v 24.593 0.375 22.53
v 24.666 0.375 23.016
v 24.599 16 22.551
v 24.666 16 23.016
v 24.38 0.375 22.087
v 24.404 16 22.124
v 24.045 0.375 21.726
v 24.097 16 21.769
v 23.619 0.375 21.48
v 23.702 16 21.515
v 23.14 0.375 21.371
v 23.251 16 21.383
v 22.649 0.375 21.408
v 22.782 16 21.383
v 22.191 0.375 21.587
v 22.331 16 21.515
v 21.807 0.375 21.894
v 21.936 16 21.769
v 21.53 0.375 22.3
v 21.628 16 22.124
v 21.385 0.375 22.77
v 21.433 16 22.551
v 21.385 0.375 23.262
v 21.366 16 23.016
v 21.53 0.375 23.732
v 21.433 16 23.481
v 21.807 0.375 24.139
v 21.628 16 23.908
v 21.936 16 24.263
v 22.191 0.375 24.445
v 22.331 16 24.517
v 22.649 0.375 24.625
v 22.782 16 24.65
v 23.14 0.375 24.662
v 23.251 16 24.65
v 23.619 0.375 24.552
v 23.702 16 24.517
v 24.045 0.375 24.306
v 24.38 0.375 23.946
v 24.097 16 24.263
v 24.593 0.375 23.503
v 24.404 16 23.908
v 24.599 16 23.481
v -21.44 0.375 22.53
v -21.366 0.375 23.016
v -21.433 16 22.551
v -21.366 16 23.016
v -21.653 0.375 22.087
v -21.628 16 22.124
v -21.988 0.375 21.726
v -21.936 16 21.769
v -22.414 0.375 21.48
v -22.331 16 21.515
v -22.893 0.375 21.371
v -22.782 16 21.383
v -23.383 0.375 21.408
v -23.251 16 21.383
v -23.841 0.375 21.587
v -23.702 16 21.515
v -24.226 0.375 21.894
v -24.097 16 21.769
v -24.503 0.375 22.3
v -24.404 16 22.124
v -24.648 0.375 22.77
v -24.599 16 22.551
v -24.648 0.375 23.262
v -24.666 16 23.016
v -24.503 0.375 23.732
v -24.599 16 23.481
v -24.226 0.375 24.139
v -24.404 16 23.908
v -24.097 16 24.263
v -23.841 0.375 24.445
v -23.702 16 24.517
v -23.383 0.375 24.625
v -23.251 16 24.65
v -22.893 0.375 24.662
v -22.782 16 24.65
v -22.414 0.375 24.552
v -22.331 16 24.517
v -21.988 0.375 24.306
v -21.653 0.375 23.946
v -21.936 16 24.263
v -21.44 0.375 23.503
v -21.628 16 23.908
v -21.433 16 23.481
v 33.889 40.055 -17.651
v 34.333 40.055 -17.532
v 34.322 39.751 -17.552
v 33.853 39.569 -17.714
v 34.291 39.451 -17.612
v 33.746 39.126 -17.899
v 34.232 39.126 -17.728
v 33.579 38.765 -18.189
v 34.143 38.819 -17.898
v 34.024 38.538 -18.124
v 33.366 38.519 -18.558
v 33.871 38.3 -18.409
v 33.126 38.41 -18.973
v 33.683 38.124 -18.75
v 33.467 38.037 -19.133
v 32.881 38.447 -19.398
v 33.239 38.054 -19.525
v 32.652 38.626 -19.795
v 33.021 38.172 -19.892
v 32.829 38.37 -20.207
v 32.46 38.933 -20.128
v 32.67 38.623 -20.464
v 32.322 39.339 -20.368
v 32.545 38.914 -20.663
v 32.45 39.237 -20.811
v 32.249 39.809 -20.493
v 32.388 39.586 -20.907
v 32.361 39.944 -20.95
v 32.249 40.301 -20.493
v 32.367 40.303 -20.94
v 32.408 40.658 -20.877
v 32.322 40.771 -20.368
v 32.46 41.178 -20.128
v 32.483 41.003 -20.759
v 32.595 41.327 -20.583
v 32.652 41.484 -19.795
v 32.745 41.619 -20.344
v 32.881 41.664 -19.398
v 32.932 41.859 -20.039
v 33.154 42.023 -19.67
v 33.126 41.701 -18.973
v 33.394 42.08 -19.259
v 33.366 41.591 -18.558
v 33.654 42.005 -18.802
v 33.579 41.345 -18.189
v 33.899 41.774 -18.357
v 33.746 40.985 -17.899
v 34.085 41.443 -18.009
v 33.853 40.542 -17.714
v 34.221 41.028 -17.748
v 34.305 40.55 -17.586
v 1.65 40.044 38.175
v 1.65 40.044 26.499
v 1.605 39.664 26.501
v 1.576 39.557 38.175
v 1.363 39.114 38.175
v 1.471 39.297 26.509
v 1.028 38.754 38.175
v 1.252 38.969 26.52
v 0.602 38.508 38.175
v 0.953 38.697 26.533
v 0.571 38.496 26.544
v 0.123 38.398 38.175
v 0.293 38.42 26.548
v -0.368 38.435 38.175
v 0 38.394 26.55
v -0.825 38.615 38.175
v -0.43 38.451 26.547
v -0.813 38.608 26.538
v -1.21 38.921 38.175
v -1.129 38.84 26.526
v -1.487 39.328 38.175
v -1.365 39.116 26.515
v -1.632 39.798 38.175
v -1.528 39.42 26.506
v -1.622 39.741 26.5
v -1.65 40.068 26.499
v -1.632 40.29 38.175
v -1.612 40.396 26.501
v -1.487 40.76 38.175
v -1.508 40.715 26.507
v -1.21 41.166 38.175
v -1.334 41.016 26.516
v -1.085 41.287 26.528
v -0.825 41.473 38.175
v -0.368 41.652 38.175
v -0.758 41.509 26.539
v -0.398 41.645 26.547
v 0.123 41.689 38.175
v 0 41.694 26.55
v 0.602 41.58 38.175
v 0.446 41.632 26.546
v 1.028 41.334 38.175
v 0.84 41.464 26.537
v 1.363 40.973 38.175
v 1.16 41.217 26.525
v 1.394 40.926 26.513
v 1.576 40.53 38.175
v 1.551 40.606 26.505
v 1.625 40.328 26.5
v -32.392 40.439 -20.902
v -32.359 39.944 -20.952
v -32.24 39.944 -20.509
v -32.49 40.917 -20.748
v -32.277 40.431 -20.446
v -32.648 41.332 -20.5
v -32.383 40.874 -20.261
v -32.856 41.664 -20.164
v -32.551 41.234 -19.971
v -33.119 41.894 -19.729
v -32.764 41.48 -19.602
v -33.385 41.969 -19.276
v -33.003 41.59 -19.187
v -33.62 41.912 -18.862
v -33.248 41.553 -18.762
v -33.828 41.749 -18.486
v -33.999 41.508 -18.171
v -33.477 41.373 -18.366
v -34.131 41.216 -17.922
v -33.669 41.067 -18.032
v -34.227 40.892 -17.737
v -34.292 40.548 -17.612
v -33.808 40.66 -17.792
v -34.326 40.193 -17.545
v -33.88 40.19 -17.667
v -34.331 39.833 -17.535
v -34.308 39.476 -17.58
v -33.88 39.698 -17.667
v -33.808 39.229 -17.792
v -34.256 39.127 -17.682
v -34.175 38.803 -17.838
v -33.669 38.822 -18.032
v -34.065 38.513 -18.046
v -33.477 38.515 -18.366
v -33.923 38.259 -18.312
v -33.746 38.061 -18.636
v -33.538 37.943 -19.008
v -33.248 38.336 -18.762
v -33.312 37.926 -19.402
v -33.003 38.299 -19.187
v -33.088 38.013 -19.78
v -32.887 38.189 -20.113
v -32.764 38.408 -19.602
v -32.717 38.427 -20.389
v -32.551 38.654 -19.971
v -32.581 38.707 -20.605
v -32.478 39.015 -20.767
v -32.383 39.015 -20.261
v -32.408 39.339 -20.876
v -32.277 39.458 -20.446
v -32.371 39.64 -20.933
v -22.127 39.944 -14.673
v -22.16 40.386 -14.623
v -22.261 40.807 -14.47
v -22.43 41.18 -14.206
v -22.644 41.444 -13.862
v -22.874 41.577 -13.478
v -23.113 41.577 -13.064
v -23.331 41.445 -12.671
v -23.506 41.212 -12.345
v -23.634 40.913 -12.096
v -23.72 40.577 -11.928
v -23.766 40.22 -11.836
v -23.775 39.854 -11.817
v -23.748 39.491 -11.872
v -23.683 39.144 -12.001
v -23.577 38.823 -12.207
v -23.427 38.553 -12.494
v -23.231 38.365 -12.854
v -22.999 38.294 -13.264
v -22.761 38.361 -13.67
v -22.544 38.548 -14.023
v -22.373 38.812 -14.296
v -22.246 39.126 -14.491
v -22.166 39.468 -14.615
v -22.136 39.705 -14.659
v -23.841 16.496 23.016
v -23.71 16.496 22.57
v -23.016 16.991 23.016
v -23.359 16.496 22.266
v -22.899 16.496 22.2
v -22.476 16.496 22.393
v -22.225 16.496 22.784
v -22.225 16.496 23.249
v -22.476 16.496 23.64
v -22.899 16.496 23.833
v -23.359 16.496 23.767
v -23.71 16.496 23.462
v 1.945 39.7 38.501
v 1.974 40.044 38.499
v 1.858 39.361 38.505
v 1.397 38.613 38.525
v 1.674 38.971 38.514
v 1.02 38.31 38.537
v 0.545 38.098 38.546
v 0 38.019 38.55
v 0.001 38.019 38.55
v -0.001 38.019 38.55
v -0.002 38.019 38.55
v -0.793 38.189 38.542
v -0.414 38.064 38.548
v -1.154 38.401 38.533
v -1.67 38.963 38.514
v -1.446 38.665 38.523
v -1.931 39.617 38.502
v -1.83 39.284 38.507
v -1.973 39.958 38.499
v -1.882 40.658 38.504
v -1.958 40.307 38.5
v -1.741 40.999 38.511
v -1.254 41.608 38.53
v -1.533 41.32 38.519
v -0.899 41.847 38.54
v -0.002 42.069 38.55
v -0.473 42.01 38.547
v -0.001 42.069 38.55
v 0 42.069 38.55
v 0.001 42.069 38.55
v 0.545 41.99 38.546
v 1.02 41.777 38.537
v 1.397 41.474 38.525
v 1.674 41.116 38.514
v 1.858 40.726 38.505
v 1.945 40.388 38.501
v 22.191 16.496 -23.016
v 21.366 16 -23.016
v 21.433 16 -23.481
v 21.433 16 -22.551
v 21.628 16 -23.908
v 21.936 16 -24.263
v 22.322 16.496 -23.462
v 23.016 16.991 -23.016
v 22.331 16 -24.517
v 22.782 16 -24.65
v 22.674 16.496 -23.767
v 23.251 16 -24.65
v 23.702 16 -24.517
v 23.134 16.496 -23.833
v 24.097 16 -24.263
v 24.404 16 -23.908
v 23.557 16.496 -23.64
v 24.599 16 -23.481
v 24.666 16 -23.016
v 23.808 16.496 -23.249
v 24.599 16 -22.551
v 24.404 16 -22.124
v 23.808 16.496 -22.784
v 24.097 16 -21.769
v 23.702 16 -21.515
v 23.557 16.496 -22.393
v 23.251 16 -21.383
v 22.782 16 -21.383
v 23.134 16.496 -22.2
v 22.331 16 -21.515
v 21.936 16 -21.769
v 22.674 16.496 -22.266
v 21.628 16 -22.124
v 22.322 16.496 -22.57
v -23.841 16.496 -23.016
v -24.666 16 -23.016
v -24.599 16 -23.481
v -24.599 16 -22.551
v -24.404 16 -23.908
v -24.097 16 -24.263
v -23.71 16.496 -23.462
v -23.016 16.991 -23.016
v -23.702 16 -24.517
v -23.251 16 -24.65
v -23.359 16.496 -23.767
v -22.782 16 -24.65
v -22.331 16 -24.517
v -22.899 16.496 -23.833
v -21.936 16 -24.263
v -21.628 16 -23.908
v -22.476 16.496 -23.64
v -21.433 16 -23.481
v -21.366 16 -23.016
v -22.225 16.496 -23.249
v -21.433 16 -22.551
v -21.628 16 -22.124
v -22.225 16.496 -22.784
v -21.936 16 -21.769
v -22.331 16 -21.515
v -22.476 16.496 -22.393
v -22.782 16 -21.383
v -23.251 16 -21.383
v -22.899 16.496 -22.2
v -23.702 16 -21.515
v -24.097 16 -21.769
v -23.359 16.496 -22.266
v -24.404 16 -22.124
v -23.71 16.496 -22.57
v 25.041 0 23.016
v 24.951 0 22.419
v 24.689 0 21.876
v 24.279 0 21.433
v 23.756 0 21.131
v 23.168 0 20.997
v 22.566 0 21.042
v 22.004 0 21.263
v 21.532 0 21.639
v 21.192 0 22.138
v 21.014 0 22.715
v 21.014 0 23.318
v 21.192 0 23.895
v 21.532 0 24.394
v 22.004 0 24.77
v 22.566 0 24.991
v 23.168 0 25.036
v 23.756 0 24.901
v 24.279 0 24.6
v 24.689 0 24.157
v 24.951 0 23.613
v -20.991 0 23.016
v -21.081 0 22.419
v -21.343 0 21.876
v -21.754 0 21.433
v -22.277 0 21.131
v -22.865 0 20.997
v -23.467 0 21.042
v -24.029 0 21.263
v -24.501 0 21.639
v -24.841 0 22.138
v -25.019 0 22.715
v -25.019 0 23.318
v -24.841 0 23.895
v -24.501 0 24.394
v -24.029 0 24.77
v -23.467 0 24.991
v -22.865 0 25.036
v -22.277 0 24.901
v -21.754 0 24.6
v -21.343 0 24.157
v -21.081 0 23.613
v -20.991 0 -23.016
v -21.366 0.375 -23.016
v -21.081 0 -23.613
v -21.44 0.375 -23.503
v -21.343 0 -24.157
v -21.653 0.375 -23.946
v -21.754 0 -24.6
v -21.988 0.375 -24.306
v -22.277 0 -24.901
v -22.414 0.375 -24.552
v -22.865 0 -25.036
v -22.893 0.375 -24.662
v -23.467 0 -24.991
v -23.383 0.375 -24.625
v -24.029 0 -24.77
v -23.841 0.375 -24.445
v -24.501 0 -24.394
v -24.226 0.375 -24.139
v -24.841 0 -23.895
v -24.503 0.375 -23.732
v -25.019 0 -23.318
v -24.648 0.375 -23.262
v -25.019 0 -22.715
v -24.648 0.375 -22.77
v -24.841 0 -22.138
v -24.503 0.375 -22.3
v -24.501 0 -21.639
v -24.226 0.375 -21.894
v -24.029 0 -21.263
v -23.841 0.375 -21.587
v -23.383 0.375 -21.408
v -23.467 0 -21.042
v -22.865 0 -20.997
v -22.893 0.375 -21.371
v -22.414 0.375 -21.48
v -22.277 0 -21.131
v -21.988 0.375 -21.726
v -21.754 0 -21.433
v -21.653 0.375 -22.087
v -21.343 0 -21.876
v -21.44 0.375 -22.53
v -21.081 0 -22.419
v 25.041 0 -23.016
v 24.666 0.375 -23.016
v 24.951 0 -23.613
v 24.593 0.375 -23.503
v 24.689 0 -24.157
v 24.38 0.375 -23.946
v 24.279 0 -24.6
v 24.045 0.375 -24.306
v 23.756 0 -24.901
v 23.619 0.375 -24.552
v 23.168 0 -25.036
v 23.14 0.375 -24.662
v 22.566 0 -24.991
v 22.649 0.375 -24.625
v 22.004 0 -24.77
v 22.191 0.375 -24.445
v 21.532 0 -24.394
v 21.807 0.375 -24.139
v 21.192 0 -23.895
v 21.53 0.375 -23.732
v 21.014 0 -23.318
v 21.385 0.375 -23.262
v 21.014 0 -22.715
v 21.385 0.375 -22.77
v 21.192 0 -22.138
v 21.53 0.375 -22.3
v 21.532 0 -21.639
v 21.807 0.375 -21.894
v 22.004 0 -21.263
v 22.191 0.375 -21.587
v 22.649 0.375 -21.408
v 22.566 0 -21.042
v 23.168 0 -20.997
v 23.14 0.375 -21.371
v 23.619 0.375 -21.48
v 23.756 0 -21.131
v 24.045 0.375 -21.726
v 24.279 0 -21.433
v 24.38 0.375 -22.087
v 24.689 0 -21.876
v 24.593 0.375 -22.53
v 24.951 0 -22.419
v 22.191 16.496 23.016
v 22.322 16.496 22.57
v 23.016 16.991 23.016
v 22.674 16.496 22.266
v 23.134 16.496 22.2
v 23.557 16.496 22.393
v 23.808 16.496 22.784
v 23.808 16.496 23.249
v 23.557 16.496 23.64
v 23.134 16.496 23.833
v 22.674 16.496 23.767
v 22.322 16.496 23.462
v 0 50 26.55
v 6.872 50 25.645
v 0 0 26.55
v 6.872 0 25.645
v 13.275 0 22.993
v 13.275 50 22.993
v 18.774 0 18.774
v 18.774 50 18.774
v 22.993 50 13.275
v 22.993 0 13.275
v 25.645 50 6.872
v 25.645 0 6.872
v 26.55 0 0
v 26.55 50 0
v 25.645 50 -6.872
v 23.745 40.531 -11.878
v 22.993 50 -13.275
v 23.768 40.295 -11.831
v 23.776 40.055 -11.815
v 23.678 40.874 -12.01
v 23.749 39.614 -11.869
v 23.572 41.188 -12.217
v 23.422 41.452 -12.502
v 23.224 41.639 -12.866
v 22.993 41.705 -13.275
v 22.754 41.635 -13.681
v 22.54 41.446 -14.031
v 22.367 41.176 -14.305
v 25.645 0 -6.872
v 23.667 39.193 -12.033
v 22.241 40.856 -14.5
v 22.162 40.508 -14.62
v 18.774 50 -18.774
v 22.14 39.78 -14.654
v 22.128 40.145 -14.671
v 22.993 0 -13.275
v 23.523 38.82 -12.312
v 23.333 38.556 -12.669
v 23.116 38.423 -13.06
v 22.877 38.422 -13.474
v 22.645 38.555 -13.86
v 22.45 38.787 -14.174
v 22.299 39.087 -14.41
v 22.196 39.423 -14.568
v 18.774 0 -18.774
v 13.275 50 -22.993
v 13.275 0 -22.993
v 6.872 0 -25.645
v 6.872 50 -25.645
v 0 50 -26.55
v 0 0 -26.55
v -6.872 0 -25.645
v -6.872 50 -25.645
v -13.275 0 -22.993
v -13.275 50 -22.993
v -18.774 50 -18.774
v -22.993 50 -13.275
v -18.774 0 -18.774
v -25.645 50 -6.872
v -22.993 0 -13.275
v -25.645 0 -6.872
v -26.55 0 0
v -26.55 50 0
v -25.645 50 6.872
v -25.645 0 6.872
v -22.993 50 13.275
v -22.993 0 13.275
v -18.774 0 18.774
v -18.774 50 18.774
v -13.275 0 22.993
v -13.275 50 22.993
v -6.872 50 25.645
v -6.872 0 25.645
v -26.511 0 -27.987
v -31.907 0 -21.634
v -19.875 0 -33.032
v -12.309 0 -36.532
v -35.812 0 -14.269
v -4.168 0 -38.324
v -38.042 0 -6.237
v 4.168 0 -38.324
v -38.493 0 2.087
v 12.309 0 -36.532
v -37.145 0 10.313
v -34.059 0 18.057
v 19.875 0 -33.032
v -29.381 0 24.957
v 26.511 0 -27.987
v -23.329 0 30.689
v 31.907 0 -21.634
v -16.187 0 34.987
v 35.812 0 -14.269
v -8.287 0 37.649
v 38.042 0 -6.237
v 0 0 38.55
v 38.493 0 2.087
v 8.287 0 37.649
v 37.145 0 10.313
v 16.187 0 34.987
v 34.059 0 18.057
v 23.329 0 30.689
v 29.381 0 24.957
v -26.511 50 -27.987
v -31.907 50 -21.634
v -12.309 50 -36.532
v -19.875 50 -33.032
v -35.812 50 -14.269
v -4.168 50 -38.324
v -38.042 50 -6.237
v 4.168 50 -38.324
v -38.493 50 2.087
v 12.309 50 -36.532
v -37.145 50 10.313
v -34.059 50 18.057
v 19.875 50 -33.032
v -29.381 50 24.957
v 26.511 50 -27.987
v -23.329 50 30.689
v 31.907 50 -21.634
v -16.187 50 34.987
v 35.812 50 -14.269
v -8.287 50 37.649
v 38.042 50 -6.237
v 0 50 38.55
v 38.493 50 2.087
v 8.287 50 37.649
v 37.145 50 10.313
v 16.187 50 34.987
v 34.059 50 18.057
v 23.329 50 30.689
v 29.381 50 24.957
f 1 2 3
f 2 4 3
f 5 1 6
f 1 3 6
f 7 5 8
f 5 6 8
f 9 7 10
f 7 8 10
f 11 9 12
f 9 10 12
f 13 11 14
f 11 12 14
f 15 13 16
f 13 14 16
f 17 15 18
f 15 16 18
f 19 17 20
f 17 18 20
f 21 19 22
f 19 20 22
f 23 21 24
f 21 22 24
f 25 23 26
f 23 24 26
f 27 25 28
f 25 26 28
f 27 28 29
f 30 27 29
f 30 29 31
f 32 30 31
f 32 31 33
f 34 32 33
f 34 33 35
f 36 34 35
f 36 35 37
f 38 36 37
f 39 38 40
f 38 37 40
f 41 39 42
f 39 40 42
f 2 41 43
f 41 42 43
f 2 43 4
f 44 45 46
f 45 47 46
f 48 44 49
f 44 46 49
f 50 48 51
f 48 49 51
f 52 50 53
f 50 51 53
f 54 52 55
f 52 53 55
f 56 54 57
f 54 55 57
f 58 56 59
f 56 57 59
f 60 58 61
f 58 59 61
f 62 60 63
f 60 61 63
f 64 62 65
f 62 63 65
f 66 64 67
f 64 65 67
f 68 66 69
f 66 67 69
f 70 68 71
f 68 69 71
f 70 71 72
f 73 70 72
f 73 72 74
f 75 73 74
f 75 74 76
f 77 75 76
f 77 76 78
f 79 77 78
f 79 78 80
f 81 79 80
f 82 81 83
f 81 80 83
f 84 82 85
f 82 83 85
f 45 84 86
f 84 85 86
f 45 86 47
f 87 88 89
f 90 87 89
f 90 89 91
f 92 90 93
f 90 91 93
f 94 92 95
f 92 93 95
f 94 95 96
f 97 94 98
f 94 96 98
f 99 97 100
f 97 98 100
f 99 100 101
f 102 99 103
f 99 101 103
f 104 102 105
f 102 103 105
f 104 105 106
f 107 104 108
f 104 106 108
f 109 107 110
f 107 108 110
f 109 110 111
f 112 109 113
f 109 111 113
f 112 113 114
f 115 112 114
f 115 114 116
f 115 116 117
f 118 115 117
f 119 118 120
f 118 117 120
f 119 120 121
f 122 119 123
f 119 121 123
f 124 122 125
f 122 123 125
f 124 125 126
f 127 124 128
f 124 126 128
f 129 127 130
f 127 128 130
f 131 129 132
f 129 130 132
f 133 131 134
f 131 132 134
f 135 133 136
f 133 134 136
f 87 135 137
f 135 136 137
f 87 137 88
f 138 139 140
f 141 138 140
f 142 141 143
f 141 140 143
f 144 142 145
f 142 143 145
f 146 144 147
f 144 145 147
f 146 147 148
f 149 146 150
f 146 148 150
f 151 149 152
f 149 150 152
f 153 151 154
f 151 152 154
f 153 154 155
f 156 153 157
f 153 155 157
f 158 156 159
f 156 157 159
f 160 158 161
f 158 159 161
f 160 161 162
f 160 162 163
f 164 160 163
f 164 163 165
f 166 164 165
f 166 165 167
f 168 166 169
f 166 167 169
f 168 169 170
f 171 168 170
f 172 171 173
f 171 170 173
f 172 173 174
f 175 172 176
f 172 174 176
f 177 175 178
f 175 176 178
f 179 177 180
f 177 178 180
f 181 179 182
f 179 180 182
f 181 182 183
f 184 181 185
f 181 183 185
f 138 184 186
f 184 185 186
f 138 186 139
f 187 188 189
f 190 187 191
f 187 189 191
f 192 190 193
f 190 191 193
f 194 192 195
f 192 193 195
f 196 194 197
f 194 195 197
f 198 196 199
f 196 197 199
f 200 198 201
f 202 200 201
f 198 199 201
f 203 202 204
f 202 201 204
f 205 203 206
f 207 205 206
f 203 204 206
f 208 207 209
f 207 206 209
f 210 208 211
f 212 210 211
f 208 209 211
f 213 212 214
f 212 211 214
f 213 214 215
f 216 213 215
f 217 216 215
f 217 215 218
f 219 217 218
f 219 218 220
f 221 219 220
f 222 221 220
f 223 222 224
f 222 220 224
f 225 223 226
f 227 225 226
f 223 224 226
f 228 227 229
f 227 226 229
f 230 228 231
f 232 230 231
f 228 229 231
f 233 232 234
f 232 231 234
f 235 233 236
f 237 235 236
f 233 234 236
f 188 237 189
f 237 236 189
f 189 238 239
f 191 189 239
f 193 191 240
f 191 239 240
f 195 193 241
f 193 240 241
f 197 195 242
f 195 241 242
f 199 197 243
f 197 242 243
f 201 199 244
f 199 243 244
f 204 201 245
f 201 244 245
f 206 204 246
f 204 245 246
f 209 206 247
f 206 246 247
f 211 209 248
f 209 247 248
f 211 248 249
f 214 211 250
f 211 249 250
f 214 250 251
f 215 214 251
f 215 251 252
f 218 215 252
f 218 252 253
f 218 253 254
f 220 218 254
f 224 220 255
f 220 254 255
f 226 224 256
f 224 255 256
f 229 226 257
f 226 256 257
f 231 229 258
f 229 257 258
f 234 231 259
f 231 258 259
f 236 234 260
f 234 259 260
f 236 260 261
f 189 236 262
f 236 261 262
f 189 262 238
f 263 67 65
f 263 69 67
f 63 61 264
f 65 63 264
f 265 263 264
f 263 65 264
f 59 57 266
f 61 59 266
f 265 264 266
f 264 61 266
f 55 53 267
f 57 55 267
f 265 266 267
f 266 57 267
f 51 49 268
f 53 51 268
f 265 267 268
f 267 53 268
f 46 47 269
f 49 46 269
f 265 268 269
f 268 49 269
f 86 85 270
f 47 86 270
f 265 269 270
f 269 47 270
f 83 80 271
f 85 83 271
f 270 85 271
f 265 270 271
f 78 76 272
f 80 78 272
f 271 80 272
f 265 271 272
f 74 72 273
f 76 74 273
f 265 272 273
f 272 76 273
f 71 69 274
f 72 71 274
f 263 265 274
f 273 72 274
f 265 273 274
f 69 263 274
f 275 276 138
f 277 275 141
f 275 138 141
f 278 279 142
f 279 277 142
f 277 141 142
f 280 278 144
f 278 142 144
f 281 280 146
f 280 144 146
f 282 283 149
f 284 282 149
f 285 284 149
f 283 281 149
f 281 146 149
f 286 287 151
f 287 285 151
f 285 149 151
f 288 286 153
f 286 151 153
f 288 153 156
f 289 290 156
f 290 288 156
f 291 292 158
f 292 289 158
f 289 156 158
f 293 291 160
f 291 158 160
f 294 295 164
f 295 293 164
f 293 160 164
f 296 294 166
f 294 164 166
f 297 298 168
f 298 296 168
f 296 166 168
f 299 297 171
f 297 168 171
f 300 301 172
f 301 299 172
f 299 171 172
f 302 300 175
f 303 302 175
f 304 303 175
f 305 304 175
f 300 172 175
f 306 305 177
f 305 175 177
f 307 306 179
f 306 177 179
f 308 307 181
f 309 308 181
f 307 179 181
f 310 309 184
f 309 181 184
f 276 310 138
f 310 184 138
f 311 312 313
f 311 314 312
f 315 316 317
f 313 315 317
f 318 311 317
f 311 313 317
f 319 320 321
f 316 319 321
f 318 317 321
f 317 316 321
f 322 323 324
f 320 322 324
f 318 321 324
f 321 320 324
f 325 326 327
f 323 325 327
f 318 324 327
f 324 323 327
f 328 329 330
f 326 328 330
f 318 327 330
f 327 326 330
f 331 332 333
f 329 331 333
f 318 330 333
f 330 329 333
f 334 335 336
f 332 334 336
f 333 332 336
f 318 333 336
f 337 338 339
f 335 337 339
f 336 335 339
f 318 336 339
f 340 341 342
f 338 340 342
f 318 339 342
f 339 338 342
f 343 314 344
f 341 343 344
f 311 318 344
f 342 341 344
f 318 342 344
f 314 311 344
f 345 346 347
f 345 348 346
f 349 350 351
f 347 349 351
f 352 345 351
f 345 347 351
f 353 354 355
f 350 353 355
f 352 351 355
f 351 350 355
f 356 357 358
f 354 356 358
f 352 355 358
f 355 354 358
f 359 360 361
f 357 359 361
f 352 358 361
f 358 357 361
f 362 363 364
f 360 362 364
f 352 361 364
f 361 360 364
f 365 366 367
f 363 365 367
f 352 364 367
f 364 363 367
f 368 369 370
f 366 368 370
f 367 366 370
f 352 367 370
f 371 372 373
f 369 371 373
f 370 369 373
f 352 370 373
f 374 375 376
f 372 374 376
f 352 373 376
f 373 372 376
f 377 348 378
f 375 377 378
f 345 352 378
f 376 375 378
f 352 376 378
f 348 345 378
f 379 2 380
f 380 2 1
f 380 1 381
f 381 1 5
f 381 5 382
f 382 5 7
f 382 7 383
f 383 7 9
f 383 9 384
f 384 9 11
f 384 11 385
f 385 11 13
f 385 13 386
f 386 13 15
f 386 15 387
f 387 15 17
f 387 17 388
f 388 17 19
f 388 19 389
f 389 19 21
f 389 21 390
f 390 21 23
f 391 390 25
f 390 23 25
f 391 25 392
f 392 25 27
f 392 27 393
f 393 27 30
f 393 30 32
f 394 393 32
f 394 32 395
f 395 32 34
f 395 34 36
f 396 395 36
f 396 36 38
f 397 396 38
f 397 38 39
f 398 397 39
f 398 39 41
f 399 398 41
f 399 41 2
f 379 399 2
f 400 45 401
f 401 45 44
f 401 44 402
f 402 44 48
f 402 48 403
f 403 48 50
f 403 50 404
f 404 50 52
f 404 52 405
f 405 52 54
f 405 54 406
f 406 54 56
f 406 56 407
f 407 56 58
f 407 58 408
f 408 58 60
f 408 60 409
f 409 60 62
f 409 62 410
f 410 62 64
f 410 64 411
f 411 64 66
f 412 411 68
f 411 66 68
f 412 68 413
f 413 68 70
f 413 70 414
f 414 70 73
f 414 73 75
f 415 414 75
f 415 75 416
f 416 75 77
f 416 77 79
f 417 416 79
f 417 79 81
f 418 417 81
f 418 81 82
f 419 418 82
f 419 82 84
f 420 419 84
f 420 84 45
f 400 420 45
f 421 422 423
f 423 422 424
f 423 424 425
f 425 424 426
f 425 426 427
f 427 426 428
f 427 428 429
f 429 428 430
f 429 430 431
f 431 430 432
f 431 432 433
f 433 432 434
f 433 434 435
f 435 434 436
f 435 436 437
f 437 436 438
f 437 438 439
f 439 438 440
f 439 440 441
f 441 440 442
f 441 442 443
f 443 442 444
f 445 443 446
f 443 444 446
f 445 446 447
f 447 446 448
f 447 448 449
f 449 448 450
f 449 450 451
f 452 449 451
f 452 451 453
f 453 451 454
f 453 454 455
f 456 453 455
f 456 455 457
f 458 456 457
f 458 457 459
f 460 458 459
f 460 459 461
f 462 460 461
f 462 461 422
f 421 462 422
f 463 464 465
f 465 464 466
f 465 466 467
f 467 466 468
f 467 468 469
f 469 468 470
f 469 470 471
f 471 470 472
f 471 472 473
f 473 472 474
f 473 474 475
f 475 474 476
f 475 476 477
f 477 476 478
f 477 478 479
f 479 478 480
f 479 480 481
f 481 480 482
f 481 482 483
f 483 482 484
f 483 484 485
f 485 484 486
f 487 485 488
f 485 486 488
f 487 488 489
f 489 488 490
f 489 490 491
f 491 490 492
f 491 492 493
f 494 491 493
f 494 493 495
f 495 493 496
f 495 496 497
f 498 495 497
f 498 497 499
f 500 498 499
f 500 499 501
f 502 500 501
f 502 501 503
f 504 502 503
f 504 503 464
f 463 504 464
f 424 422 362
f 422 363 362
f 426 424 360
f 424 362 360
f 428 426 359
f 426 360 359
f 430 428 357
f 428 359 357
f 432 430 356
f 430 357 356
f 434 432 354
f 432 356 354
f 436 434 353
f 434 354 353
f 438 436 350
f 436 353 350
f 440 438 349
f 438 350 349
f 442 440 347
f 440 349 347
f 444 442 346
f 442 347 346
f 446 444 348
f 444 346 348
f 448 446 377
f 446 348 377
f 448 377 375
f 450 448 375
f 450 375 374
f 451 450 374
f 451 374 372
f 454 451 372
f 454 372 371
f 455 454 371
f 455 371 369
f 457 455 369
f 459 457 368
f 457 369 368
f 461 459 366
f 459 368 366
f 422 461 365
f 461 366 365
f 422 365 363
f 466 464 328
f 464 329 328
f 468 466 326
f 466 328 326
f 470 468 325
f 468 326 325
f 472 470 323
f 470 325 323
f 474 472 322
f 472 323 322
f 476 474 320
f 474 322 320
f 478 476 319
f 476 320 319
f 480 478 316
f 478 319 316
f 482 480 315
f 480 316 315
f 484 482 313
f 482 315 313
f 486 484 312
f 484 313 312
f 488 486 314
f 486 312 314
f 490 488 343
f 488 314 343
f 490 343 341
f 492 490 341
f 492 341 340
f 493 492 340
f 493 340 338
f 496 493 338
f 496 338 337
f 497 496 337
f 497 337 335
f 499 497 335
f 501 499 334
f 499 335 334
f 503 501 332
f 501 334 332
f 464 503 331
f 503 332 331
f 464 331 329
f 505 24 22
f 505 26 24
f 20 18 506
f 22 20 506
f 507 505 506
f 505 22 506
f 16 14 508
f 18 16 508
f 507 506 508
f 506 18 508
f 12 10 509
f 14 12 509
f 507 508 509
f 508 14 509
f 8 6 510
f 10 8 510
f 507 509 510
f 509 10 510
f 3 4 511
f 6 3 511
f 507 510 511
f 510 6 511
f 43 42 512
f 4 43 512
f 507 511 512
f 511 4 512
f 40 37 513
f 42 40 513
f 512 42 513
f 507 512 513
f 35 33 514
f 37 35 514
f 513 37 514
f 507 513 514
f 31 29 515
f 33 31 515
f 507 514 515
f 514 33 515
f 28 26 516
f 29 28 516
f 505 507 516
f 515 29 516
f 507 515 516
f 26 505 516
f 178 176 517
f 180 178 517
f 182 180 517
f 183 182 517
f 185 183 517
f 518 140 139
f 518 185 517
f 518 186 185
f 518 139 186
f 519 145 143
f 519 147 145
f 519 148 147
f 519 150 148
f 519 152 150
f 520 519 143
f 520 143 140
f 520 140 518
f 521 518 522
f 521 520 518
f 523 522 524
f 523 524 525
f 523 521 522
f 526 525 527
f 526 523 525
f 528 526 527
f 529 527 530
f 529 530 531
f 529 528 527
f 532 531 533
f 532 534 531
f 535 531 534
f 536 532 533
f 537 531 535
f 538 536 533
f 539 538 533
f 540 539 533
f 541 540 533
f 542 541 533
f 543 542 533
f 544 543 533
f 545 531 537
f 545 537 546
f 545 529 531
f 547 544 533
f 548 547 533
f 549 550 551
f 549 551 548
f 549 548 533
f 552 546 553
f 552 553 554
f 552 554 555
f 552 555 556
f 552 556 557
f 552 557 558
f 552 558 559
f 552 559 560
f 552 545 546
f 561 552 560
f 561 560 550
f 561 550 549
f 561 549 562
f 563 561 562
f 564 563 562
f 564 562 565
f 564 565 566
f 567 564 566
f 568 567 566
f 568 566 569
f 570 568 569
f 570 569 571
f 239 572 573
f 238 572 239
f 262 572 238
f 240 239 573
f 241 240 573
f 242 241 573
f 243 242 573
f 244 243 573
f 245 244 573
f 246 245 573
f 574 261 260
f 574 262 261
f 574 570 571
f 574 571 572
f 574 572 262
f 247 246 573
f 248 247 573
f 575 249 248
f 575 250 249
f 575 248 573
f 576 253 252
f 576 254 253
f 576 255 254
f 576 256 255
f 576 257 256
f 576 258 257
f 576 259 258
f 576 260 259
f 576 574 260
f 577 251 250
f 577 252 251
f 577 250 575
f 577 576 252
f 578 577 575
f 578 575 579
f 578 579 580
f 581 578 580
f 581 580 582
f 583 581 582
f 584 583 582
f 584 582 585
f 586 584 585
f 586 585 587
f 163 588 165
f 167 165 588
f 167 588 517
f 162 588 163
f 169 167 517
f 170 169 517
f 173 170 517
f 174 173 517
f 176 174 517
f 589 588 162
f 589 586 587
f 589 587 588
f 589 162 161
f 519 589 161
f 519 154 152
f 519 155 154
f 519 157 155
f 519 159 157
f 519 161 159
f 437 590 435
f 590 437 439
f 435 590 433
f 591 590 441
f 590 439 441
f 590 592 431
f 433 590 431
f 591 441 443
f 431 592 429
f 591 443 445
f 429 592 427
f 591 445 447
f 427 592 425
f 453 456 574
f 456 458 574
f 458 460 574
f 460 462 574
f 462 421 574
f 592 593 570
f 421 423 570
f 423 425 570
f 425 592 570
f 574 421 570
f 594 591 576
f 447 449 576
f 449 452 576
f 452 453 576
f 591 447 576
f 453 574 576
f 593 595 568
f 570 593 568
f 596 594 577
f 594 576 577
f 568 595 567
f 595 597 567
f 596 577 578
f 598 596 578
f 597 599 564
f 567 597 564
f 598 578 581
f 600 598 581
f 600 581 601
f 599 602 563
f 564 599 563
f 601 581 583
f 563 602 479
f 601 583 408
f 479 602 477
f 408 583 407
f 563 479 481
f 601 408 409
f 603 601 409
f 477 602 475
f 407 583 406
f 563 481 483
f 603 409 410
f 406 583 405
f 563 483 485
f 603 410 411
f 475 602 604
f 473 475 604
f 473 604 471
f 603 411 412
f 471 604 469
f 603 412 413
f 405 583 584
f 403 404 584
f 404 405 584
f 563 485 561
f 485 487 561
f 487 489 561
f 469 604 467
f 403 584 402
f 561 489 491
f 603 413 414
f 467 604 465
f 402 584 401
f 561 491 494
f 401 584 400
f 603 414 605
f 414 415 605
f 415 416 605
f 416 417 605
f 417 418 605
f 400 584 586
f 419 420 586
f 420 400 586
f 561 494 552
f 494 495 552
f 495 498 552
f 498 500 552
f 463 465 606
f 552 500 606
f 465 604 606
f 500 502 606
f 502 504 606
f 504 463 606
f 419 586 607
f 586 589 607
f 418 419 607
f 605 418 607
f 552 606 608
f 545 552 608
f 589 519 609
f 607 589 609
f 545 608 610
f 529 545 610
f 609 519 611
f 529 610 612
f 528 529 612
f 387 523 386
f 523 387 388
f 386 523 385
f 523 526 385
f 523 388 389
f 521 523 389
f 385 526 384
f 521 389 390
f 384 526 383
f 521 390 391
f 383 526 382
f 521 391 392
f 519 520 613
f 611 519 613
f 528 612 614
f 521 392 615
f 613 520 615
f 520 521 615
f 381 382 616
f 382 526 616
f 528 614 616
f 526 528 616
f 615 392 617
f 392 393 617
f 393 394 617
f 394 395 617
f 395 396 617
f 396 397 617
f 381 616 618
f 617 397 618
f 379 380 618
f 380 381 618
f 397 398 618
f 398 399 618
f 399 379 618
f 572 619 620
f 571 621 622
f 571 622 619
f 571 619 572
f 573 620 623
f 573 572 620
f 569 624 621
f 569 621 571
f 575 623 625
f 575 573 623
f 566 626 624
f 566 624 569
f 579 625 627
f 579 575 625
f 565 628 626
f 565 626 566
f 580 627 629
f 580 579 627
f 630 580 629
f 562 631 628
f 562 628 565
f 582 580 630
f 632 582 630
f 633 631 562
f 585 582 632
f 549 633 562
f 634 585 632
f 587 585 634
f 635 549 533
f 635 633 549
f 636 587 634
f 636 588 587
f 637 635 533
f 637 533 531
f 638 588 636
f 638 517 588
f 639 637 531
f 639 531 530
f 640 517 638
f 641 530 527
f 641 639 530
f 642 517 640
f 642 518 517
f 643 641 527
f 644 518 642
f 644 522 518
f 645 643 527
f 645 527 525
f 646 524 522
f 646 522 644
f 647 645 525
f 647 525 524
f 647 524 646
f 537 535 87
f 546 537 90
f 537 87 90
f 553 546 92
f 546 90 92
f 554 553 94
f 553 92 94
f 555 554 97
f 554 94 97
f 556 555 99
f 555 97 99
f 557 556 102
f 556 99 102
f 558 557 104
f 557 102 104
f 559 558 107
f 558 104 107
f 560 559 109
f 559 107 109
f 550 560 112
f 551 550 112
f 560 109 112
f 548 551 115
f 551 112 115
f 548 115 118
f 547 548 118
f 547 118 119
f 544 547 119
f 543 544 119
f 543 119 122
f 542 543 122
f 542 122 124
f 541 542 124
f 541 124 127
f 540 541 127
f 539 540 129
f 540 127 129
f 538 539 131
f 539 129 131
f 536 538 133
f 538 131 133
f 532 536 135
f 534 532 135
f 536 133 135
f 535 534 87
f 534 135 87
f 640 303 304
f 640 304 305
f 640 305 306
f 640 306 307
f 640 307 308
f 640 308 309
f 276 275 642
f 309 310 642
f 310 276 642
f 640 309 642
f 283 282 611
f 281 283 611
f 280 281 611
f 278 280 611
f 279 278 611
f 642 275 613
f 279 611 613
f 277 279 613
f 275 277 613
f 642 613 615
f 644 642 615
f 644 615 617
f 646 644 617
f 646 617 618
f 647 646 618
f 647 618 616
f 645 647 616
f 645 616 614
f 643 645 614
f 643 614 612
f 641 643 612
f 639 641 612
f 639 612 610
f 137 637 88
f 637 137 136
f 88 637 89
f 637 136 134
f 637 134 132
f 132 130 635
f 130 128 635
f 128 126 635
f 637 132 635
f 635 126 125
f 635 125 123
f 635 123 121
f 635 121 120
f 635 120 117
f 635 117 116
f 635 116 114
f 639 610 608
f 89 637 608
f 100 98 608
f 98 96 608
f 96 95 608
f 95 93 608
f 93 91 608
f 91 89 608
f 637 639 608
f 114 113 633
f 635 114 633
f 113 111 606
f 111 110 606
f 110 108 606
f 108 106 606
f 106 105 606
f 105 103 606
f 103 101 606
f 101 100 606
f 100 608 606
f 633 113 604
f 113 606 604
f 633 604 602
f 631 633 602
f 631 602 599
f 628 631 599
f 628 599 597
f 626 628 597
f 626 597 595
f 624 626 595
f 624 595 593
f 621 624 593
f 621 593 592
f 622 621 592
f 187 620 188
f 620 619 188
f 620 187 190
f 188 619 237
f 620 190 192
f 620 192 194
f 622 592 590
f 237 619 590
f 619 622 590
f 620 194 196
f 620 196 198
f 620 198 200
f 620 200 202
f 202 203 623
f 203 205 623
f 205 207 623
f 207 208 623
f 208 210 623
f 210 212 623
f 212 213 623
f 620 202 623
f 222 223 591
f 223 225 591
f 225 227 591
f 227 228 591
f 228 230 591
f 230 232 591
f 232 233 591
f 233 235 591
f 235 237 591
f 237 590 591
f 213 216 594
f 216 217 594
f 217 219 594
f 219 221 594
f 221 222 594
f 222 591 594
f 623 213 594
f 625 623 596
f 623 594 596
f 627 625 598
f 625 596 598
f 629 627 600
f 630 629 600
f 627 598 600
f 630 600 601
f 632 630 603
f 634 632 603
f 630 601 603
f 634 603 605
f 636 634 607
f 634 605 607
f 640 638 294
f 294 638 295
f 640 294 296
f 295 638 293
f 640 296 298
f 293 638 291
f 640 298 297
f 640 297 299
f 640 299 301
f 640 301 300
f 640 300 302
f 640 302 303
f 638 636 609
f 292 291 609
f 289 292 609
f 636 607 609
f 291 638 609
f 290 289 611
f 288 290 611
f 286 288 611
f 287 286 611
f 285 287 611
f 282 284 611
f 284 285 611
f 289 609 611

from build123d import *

# Parameters (mm, degrees)
ESQUISSE1_R                     = 38.550000000000004
ESQUISSE1_R_2                   = 26.55
BOSS_EXTRU_1_DEPTH              = 50
TROU_TARAUD_M4X0_71_D           = 3.3
TROU_TARAUD_M4X0_71_DEPTH       = 16
TROU_TARAUD_M4X0_71_CSINK_D     = 4.05
TROU_TARAUD_M4X0_71_CSINK_ANGLE = 90
TROU_TARAUD_M4X0_71_TIP         = 0.9914200213954745


# Read off the part's stored shape, not the designer's step: Trou taraudé M4x0.74
with BuildPart() as part:
    # Esquisse1 → Boss.-Extru.1 (new body)
    with BuildSketch(Plane(origin=(0, 0, 0), x_dir=(1, 0, 0), z_dir=(0, 1, 0))):
        with Locations(Location((0, 0, 0), (0, 0, 270))):
            Circle(ESQUISSE1_R)
        with Locations(Location((0, 0, 0), (0, 0, 270))):
            Circle(ESQUISSE1_R_2, mode=Mode.SUBTRACT)
    extrude(amount=BOSS_EXTRU_1_DEPTH)

    # Trou taraudé M4x0.71
    with Locations(Plane(origin=(0, 0, 0), x_dir=(-1, 0, 0), z_dir=(0, -1, 0))):
        with Locations((-23.016325728, -23.016325728), (-23.016325728, 23.016325728), (23.016325728, 23.016325728), (23.016325728, -23.016325728)):
            CounterSinkHole(TROU_TARAUD_M4X0_71_D / 2, TROU_TARAUD_M4X0_71_CSINK_D / 2, depth=TROU_TARAUD_M4X0_71_DEPTH, counter_sink_angle=TROU_TARAUD_M4X0_71_CSINK_ANGLE)
            with Locations((0, 0, -(TROU_TARAUD_M4X0_71_DEPTH + TROU_TARAUD_M4X0_71_TIP / 2))):  # 118° drill point
                Cone(0, TROU_TARAUD_M4X0_71_D / 2, TROU_TARAUD_M4X0_71_TIP, mode=Mode.SUBTRACT)

    # Trou taraudé M4x0.74 outline → Trou taraudé M4x0.74 (revolve, cut)
    with BuildSketch(Plane(origin=(0, 39.944411858, 0), x_dir=(0.4998061049474771, 0, -0.8661373202080785), z_dir=(0, -1, 0))):
        Polygon((0, -38.55002295), (2.02502295, -38.55002295), (1.65, -38.175), (1.65, -26.498651577), (0, -26.498651577), align=None)
    revolve(axis=Axis((0, 39.944411858, 0), (0.8661373202080785, 0, 0.4998061049474771)), mode=Mode.SUBTRACT)

    # Trou taraud_ M4x0.74 2 outline → Trou taraud_ M4x0.74 2 (revolve, cut)
    with BuildSketch(Plane(origin=(0, 40.055300006, 0), x_dir=(0.49980598723152586, 0, 0.8661373881362702), z_dir=(0, 1.0000000000000002, 0))):
        Polygon((2.025014074, 38.550014074), (0, 38.550014074), (0, 26.498651577), (1.65, 26.498651577), (1.65, 38.175), align=None)
    revolve(axis=Axis((0, 40.055300006, 0), (0.8661373881362704, 0, -0.49980598723152597)), mode=Mode.SUBTRACT)

    # Trou taraud_ M4x0.74 3 outline → Trou taraud_ M4x0.74 3 (revolve, cut)
    with BuildSketch(Plane(origin=(0, 40.043688013, 0), x_dir=(0.9999999999344692, 0, 1.1448216284808903e-05), z_dir=(0, 1, 0))):
        Polygon((0, -38.549999963), (2.024999963, -38.549999963), (1.65, -38.175), (1.65, -26.498658226), (0, -26.498658226), align=None)
    revolve(axis=Axis((0, 40.043688013, 0), (1.1448216284808903e-05, 0, -0.9999999999344692)), mode=Mode.SUBTRACT)


solid = part.part
